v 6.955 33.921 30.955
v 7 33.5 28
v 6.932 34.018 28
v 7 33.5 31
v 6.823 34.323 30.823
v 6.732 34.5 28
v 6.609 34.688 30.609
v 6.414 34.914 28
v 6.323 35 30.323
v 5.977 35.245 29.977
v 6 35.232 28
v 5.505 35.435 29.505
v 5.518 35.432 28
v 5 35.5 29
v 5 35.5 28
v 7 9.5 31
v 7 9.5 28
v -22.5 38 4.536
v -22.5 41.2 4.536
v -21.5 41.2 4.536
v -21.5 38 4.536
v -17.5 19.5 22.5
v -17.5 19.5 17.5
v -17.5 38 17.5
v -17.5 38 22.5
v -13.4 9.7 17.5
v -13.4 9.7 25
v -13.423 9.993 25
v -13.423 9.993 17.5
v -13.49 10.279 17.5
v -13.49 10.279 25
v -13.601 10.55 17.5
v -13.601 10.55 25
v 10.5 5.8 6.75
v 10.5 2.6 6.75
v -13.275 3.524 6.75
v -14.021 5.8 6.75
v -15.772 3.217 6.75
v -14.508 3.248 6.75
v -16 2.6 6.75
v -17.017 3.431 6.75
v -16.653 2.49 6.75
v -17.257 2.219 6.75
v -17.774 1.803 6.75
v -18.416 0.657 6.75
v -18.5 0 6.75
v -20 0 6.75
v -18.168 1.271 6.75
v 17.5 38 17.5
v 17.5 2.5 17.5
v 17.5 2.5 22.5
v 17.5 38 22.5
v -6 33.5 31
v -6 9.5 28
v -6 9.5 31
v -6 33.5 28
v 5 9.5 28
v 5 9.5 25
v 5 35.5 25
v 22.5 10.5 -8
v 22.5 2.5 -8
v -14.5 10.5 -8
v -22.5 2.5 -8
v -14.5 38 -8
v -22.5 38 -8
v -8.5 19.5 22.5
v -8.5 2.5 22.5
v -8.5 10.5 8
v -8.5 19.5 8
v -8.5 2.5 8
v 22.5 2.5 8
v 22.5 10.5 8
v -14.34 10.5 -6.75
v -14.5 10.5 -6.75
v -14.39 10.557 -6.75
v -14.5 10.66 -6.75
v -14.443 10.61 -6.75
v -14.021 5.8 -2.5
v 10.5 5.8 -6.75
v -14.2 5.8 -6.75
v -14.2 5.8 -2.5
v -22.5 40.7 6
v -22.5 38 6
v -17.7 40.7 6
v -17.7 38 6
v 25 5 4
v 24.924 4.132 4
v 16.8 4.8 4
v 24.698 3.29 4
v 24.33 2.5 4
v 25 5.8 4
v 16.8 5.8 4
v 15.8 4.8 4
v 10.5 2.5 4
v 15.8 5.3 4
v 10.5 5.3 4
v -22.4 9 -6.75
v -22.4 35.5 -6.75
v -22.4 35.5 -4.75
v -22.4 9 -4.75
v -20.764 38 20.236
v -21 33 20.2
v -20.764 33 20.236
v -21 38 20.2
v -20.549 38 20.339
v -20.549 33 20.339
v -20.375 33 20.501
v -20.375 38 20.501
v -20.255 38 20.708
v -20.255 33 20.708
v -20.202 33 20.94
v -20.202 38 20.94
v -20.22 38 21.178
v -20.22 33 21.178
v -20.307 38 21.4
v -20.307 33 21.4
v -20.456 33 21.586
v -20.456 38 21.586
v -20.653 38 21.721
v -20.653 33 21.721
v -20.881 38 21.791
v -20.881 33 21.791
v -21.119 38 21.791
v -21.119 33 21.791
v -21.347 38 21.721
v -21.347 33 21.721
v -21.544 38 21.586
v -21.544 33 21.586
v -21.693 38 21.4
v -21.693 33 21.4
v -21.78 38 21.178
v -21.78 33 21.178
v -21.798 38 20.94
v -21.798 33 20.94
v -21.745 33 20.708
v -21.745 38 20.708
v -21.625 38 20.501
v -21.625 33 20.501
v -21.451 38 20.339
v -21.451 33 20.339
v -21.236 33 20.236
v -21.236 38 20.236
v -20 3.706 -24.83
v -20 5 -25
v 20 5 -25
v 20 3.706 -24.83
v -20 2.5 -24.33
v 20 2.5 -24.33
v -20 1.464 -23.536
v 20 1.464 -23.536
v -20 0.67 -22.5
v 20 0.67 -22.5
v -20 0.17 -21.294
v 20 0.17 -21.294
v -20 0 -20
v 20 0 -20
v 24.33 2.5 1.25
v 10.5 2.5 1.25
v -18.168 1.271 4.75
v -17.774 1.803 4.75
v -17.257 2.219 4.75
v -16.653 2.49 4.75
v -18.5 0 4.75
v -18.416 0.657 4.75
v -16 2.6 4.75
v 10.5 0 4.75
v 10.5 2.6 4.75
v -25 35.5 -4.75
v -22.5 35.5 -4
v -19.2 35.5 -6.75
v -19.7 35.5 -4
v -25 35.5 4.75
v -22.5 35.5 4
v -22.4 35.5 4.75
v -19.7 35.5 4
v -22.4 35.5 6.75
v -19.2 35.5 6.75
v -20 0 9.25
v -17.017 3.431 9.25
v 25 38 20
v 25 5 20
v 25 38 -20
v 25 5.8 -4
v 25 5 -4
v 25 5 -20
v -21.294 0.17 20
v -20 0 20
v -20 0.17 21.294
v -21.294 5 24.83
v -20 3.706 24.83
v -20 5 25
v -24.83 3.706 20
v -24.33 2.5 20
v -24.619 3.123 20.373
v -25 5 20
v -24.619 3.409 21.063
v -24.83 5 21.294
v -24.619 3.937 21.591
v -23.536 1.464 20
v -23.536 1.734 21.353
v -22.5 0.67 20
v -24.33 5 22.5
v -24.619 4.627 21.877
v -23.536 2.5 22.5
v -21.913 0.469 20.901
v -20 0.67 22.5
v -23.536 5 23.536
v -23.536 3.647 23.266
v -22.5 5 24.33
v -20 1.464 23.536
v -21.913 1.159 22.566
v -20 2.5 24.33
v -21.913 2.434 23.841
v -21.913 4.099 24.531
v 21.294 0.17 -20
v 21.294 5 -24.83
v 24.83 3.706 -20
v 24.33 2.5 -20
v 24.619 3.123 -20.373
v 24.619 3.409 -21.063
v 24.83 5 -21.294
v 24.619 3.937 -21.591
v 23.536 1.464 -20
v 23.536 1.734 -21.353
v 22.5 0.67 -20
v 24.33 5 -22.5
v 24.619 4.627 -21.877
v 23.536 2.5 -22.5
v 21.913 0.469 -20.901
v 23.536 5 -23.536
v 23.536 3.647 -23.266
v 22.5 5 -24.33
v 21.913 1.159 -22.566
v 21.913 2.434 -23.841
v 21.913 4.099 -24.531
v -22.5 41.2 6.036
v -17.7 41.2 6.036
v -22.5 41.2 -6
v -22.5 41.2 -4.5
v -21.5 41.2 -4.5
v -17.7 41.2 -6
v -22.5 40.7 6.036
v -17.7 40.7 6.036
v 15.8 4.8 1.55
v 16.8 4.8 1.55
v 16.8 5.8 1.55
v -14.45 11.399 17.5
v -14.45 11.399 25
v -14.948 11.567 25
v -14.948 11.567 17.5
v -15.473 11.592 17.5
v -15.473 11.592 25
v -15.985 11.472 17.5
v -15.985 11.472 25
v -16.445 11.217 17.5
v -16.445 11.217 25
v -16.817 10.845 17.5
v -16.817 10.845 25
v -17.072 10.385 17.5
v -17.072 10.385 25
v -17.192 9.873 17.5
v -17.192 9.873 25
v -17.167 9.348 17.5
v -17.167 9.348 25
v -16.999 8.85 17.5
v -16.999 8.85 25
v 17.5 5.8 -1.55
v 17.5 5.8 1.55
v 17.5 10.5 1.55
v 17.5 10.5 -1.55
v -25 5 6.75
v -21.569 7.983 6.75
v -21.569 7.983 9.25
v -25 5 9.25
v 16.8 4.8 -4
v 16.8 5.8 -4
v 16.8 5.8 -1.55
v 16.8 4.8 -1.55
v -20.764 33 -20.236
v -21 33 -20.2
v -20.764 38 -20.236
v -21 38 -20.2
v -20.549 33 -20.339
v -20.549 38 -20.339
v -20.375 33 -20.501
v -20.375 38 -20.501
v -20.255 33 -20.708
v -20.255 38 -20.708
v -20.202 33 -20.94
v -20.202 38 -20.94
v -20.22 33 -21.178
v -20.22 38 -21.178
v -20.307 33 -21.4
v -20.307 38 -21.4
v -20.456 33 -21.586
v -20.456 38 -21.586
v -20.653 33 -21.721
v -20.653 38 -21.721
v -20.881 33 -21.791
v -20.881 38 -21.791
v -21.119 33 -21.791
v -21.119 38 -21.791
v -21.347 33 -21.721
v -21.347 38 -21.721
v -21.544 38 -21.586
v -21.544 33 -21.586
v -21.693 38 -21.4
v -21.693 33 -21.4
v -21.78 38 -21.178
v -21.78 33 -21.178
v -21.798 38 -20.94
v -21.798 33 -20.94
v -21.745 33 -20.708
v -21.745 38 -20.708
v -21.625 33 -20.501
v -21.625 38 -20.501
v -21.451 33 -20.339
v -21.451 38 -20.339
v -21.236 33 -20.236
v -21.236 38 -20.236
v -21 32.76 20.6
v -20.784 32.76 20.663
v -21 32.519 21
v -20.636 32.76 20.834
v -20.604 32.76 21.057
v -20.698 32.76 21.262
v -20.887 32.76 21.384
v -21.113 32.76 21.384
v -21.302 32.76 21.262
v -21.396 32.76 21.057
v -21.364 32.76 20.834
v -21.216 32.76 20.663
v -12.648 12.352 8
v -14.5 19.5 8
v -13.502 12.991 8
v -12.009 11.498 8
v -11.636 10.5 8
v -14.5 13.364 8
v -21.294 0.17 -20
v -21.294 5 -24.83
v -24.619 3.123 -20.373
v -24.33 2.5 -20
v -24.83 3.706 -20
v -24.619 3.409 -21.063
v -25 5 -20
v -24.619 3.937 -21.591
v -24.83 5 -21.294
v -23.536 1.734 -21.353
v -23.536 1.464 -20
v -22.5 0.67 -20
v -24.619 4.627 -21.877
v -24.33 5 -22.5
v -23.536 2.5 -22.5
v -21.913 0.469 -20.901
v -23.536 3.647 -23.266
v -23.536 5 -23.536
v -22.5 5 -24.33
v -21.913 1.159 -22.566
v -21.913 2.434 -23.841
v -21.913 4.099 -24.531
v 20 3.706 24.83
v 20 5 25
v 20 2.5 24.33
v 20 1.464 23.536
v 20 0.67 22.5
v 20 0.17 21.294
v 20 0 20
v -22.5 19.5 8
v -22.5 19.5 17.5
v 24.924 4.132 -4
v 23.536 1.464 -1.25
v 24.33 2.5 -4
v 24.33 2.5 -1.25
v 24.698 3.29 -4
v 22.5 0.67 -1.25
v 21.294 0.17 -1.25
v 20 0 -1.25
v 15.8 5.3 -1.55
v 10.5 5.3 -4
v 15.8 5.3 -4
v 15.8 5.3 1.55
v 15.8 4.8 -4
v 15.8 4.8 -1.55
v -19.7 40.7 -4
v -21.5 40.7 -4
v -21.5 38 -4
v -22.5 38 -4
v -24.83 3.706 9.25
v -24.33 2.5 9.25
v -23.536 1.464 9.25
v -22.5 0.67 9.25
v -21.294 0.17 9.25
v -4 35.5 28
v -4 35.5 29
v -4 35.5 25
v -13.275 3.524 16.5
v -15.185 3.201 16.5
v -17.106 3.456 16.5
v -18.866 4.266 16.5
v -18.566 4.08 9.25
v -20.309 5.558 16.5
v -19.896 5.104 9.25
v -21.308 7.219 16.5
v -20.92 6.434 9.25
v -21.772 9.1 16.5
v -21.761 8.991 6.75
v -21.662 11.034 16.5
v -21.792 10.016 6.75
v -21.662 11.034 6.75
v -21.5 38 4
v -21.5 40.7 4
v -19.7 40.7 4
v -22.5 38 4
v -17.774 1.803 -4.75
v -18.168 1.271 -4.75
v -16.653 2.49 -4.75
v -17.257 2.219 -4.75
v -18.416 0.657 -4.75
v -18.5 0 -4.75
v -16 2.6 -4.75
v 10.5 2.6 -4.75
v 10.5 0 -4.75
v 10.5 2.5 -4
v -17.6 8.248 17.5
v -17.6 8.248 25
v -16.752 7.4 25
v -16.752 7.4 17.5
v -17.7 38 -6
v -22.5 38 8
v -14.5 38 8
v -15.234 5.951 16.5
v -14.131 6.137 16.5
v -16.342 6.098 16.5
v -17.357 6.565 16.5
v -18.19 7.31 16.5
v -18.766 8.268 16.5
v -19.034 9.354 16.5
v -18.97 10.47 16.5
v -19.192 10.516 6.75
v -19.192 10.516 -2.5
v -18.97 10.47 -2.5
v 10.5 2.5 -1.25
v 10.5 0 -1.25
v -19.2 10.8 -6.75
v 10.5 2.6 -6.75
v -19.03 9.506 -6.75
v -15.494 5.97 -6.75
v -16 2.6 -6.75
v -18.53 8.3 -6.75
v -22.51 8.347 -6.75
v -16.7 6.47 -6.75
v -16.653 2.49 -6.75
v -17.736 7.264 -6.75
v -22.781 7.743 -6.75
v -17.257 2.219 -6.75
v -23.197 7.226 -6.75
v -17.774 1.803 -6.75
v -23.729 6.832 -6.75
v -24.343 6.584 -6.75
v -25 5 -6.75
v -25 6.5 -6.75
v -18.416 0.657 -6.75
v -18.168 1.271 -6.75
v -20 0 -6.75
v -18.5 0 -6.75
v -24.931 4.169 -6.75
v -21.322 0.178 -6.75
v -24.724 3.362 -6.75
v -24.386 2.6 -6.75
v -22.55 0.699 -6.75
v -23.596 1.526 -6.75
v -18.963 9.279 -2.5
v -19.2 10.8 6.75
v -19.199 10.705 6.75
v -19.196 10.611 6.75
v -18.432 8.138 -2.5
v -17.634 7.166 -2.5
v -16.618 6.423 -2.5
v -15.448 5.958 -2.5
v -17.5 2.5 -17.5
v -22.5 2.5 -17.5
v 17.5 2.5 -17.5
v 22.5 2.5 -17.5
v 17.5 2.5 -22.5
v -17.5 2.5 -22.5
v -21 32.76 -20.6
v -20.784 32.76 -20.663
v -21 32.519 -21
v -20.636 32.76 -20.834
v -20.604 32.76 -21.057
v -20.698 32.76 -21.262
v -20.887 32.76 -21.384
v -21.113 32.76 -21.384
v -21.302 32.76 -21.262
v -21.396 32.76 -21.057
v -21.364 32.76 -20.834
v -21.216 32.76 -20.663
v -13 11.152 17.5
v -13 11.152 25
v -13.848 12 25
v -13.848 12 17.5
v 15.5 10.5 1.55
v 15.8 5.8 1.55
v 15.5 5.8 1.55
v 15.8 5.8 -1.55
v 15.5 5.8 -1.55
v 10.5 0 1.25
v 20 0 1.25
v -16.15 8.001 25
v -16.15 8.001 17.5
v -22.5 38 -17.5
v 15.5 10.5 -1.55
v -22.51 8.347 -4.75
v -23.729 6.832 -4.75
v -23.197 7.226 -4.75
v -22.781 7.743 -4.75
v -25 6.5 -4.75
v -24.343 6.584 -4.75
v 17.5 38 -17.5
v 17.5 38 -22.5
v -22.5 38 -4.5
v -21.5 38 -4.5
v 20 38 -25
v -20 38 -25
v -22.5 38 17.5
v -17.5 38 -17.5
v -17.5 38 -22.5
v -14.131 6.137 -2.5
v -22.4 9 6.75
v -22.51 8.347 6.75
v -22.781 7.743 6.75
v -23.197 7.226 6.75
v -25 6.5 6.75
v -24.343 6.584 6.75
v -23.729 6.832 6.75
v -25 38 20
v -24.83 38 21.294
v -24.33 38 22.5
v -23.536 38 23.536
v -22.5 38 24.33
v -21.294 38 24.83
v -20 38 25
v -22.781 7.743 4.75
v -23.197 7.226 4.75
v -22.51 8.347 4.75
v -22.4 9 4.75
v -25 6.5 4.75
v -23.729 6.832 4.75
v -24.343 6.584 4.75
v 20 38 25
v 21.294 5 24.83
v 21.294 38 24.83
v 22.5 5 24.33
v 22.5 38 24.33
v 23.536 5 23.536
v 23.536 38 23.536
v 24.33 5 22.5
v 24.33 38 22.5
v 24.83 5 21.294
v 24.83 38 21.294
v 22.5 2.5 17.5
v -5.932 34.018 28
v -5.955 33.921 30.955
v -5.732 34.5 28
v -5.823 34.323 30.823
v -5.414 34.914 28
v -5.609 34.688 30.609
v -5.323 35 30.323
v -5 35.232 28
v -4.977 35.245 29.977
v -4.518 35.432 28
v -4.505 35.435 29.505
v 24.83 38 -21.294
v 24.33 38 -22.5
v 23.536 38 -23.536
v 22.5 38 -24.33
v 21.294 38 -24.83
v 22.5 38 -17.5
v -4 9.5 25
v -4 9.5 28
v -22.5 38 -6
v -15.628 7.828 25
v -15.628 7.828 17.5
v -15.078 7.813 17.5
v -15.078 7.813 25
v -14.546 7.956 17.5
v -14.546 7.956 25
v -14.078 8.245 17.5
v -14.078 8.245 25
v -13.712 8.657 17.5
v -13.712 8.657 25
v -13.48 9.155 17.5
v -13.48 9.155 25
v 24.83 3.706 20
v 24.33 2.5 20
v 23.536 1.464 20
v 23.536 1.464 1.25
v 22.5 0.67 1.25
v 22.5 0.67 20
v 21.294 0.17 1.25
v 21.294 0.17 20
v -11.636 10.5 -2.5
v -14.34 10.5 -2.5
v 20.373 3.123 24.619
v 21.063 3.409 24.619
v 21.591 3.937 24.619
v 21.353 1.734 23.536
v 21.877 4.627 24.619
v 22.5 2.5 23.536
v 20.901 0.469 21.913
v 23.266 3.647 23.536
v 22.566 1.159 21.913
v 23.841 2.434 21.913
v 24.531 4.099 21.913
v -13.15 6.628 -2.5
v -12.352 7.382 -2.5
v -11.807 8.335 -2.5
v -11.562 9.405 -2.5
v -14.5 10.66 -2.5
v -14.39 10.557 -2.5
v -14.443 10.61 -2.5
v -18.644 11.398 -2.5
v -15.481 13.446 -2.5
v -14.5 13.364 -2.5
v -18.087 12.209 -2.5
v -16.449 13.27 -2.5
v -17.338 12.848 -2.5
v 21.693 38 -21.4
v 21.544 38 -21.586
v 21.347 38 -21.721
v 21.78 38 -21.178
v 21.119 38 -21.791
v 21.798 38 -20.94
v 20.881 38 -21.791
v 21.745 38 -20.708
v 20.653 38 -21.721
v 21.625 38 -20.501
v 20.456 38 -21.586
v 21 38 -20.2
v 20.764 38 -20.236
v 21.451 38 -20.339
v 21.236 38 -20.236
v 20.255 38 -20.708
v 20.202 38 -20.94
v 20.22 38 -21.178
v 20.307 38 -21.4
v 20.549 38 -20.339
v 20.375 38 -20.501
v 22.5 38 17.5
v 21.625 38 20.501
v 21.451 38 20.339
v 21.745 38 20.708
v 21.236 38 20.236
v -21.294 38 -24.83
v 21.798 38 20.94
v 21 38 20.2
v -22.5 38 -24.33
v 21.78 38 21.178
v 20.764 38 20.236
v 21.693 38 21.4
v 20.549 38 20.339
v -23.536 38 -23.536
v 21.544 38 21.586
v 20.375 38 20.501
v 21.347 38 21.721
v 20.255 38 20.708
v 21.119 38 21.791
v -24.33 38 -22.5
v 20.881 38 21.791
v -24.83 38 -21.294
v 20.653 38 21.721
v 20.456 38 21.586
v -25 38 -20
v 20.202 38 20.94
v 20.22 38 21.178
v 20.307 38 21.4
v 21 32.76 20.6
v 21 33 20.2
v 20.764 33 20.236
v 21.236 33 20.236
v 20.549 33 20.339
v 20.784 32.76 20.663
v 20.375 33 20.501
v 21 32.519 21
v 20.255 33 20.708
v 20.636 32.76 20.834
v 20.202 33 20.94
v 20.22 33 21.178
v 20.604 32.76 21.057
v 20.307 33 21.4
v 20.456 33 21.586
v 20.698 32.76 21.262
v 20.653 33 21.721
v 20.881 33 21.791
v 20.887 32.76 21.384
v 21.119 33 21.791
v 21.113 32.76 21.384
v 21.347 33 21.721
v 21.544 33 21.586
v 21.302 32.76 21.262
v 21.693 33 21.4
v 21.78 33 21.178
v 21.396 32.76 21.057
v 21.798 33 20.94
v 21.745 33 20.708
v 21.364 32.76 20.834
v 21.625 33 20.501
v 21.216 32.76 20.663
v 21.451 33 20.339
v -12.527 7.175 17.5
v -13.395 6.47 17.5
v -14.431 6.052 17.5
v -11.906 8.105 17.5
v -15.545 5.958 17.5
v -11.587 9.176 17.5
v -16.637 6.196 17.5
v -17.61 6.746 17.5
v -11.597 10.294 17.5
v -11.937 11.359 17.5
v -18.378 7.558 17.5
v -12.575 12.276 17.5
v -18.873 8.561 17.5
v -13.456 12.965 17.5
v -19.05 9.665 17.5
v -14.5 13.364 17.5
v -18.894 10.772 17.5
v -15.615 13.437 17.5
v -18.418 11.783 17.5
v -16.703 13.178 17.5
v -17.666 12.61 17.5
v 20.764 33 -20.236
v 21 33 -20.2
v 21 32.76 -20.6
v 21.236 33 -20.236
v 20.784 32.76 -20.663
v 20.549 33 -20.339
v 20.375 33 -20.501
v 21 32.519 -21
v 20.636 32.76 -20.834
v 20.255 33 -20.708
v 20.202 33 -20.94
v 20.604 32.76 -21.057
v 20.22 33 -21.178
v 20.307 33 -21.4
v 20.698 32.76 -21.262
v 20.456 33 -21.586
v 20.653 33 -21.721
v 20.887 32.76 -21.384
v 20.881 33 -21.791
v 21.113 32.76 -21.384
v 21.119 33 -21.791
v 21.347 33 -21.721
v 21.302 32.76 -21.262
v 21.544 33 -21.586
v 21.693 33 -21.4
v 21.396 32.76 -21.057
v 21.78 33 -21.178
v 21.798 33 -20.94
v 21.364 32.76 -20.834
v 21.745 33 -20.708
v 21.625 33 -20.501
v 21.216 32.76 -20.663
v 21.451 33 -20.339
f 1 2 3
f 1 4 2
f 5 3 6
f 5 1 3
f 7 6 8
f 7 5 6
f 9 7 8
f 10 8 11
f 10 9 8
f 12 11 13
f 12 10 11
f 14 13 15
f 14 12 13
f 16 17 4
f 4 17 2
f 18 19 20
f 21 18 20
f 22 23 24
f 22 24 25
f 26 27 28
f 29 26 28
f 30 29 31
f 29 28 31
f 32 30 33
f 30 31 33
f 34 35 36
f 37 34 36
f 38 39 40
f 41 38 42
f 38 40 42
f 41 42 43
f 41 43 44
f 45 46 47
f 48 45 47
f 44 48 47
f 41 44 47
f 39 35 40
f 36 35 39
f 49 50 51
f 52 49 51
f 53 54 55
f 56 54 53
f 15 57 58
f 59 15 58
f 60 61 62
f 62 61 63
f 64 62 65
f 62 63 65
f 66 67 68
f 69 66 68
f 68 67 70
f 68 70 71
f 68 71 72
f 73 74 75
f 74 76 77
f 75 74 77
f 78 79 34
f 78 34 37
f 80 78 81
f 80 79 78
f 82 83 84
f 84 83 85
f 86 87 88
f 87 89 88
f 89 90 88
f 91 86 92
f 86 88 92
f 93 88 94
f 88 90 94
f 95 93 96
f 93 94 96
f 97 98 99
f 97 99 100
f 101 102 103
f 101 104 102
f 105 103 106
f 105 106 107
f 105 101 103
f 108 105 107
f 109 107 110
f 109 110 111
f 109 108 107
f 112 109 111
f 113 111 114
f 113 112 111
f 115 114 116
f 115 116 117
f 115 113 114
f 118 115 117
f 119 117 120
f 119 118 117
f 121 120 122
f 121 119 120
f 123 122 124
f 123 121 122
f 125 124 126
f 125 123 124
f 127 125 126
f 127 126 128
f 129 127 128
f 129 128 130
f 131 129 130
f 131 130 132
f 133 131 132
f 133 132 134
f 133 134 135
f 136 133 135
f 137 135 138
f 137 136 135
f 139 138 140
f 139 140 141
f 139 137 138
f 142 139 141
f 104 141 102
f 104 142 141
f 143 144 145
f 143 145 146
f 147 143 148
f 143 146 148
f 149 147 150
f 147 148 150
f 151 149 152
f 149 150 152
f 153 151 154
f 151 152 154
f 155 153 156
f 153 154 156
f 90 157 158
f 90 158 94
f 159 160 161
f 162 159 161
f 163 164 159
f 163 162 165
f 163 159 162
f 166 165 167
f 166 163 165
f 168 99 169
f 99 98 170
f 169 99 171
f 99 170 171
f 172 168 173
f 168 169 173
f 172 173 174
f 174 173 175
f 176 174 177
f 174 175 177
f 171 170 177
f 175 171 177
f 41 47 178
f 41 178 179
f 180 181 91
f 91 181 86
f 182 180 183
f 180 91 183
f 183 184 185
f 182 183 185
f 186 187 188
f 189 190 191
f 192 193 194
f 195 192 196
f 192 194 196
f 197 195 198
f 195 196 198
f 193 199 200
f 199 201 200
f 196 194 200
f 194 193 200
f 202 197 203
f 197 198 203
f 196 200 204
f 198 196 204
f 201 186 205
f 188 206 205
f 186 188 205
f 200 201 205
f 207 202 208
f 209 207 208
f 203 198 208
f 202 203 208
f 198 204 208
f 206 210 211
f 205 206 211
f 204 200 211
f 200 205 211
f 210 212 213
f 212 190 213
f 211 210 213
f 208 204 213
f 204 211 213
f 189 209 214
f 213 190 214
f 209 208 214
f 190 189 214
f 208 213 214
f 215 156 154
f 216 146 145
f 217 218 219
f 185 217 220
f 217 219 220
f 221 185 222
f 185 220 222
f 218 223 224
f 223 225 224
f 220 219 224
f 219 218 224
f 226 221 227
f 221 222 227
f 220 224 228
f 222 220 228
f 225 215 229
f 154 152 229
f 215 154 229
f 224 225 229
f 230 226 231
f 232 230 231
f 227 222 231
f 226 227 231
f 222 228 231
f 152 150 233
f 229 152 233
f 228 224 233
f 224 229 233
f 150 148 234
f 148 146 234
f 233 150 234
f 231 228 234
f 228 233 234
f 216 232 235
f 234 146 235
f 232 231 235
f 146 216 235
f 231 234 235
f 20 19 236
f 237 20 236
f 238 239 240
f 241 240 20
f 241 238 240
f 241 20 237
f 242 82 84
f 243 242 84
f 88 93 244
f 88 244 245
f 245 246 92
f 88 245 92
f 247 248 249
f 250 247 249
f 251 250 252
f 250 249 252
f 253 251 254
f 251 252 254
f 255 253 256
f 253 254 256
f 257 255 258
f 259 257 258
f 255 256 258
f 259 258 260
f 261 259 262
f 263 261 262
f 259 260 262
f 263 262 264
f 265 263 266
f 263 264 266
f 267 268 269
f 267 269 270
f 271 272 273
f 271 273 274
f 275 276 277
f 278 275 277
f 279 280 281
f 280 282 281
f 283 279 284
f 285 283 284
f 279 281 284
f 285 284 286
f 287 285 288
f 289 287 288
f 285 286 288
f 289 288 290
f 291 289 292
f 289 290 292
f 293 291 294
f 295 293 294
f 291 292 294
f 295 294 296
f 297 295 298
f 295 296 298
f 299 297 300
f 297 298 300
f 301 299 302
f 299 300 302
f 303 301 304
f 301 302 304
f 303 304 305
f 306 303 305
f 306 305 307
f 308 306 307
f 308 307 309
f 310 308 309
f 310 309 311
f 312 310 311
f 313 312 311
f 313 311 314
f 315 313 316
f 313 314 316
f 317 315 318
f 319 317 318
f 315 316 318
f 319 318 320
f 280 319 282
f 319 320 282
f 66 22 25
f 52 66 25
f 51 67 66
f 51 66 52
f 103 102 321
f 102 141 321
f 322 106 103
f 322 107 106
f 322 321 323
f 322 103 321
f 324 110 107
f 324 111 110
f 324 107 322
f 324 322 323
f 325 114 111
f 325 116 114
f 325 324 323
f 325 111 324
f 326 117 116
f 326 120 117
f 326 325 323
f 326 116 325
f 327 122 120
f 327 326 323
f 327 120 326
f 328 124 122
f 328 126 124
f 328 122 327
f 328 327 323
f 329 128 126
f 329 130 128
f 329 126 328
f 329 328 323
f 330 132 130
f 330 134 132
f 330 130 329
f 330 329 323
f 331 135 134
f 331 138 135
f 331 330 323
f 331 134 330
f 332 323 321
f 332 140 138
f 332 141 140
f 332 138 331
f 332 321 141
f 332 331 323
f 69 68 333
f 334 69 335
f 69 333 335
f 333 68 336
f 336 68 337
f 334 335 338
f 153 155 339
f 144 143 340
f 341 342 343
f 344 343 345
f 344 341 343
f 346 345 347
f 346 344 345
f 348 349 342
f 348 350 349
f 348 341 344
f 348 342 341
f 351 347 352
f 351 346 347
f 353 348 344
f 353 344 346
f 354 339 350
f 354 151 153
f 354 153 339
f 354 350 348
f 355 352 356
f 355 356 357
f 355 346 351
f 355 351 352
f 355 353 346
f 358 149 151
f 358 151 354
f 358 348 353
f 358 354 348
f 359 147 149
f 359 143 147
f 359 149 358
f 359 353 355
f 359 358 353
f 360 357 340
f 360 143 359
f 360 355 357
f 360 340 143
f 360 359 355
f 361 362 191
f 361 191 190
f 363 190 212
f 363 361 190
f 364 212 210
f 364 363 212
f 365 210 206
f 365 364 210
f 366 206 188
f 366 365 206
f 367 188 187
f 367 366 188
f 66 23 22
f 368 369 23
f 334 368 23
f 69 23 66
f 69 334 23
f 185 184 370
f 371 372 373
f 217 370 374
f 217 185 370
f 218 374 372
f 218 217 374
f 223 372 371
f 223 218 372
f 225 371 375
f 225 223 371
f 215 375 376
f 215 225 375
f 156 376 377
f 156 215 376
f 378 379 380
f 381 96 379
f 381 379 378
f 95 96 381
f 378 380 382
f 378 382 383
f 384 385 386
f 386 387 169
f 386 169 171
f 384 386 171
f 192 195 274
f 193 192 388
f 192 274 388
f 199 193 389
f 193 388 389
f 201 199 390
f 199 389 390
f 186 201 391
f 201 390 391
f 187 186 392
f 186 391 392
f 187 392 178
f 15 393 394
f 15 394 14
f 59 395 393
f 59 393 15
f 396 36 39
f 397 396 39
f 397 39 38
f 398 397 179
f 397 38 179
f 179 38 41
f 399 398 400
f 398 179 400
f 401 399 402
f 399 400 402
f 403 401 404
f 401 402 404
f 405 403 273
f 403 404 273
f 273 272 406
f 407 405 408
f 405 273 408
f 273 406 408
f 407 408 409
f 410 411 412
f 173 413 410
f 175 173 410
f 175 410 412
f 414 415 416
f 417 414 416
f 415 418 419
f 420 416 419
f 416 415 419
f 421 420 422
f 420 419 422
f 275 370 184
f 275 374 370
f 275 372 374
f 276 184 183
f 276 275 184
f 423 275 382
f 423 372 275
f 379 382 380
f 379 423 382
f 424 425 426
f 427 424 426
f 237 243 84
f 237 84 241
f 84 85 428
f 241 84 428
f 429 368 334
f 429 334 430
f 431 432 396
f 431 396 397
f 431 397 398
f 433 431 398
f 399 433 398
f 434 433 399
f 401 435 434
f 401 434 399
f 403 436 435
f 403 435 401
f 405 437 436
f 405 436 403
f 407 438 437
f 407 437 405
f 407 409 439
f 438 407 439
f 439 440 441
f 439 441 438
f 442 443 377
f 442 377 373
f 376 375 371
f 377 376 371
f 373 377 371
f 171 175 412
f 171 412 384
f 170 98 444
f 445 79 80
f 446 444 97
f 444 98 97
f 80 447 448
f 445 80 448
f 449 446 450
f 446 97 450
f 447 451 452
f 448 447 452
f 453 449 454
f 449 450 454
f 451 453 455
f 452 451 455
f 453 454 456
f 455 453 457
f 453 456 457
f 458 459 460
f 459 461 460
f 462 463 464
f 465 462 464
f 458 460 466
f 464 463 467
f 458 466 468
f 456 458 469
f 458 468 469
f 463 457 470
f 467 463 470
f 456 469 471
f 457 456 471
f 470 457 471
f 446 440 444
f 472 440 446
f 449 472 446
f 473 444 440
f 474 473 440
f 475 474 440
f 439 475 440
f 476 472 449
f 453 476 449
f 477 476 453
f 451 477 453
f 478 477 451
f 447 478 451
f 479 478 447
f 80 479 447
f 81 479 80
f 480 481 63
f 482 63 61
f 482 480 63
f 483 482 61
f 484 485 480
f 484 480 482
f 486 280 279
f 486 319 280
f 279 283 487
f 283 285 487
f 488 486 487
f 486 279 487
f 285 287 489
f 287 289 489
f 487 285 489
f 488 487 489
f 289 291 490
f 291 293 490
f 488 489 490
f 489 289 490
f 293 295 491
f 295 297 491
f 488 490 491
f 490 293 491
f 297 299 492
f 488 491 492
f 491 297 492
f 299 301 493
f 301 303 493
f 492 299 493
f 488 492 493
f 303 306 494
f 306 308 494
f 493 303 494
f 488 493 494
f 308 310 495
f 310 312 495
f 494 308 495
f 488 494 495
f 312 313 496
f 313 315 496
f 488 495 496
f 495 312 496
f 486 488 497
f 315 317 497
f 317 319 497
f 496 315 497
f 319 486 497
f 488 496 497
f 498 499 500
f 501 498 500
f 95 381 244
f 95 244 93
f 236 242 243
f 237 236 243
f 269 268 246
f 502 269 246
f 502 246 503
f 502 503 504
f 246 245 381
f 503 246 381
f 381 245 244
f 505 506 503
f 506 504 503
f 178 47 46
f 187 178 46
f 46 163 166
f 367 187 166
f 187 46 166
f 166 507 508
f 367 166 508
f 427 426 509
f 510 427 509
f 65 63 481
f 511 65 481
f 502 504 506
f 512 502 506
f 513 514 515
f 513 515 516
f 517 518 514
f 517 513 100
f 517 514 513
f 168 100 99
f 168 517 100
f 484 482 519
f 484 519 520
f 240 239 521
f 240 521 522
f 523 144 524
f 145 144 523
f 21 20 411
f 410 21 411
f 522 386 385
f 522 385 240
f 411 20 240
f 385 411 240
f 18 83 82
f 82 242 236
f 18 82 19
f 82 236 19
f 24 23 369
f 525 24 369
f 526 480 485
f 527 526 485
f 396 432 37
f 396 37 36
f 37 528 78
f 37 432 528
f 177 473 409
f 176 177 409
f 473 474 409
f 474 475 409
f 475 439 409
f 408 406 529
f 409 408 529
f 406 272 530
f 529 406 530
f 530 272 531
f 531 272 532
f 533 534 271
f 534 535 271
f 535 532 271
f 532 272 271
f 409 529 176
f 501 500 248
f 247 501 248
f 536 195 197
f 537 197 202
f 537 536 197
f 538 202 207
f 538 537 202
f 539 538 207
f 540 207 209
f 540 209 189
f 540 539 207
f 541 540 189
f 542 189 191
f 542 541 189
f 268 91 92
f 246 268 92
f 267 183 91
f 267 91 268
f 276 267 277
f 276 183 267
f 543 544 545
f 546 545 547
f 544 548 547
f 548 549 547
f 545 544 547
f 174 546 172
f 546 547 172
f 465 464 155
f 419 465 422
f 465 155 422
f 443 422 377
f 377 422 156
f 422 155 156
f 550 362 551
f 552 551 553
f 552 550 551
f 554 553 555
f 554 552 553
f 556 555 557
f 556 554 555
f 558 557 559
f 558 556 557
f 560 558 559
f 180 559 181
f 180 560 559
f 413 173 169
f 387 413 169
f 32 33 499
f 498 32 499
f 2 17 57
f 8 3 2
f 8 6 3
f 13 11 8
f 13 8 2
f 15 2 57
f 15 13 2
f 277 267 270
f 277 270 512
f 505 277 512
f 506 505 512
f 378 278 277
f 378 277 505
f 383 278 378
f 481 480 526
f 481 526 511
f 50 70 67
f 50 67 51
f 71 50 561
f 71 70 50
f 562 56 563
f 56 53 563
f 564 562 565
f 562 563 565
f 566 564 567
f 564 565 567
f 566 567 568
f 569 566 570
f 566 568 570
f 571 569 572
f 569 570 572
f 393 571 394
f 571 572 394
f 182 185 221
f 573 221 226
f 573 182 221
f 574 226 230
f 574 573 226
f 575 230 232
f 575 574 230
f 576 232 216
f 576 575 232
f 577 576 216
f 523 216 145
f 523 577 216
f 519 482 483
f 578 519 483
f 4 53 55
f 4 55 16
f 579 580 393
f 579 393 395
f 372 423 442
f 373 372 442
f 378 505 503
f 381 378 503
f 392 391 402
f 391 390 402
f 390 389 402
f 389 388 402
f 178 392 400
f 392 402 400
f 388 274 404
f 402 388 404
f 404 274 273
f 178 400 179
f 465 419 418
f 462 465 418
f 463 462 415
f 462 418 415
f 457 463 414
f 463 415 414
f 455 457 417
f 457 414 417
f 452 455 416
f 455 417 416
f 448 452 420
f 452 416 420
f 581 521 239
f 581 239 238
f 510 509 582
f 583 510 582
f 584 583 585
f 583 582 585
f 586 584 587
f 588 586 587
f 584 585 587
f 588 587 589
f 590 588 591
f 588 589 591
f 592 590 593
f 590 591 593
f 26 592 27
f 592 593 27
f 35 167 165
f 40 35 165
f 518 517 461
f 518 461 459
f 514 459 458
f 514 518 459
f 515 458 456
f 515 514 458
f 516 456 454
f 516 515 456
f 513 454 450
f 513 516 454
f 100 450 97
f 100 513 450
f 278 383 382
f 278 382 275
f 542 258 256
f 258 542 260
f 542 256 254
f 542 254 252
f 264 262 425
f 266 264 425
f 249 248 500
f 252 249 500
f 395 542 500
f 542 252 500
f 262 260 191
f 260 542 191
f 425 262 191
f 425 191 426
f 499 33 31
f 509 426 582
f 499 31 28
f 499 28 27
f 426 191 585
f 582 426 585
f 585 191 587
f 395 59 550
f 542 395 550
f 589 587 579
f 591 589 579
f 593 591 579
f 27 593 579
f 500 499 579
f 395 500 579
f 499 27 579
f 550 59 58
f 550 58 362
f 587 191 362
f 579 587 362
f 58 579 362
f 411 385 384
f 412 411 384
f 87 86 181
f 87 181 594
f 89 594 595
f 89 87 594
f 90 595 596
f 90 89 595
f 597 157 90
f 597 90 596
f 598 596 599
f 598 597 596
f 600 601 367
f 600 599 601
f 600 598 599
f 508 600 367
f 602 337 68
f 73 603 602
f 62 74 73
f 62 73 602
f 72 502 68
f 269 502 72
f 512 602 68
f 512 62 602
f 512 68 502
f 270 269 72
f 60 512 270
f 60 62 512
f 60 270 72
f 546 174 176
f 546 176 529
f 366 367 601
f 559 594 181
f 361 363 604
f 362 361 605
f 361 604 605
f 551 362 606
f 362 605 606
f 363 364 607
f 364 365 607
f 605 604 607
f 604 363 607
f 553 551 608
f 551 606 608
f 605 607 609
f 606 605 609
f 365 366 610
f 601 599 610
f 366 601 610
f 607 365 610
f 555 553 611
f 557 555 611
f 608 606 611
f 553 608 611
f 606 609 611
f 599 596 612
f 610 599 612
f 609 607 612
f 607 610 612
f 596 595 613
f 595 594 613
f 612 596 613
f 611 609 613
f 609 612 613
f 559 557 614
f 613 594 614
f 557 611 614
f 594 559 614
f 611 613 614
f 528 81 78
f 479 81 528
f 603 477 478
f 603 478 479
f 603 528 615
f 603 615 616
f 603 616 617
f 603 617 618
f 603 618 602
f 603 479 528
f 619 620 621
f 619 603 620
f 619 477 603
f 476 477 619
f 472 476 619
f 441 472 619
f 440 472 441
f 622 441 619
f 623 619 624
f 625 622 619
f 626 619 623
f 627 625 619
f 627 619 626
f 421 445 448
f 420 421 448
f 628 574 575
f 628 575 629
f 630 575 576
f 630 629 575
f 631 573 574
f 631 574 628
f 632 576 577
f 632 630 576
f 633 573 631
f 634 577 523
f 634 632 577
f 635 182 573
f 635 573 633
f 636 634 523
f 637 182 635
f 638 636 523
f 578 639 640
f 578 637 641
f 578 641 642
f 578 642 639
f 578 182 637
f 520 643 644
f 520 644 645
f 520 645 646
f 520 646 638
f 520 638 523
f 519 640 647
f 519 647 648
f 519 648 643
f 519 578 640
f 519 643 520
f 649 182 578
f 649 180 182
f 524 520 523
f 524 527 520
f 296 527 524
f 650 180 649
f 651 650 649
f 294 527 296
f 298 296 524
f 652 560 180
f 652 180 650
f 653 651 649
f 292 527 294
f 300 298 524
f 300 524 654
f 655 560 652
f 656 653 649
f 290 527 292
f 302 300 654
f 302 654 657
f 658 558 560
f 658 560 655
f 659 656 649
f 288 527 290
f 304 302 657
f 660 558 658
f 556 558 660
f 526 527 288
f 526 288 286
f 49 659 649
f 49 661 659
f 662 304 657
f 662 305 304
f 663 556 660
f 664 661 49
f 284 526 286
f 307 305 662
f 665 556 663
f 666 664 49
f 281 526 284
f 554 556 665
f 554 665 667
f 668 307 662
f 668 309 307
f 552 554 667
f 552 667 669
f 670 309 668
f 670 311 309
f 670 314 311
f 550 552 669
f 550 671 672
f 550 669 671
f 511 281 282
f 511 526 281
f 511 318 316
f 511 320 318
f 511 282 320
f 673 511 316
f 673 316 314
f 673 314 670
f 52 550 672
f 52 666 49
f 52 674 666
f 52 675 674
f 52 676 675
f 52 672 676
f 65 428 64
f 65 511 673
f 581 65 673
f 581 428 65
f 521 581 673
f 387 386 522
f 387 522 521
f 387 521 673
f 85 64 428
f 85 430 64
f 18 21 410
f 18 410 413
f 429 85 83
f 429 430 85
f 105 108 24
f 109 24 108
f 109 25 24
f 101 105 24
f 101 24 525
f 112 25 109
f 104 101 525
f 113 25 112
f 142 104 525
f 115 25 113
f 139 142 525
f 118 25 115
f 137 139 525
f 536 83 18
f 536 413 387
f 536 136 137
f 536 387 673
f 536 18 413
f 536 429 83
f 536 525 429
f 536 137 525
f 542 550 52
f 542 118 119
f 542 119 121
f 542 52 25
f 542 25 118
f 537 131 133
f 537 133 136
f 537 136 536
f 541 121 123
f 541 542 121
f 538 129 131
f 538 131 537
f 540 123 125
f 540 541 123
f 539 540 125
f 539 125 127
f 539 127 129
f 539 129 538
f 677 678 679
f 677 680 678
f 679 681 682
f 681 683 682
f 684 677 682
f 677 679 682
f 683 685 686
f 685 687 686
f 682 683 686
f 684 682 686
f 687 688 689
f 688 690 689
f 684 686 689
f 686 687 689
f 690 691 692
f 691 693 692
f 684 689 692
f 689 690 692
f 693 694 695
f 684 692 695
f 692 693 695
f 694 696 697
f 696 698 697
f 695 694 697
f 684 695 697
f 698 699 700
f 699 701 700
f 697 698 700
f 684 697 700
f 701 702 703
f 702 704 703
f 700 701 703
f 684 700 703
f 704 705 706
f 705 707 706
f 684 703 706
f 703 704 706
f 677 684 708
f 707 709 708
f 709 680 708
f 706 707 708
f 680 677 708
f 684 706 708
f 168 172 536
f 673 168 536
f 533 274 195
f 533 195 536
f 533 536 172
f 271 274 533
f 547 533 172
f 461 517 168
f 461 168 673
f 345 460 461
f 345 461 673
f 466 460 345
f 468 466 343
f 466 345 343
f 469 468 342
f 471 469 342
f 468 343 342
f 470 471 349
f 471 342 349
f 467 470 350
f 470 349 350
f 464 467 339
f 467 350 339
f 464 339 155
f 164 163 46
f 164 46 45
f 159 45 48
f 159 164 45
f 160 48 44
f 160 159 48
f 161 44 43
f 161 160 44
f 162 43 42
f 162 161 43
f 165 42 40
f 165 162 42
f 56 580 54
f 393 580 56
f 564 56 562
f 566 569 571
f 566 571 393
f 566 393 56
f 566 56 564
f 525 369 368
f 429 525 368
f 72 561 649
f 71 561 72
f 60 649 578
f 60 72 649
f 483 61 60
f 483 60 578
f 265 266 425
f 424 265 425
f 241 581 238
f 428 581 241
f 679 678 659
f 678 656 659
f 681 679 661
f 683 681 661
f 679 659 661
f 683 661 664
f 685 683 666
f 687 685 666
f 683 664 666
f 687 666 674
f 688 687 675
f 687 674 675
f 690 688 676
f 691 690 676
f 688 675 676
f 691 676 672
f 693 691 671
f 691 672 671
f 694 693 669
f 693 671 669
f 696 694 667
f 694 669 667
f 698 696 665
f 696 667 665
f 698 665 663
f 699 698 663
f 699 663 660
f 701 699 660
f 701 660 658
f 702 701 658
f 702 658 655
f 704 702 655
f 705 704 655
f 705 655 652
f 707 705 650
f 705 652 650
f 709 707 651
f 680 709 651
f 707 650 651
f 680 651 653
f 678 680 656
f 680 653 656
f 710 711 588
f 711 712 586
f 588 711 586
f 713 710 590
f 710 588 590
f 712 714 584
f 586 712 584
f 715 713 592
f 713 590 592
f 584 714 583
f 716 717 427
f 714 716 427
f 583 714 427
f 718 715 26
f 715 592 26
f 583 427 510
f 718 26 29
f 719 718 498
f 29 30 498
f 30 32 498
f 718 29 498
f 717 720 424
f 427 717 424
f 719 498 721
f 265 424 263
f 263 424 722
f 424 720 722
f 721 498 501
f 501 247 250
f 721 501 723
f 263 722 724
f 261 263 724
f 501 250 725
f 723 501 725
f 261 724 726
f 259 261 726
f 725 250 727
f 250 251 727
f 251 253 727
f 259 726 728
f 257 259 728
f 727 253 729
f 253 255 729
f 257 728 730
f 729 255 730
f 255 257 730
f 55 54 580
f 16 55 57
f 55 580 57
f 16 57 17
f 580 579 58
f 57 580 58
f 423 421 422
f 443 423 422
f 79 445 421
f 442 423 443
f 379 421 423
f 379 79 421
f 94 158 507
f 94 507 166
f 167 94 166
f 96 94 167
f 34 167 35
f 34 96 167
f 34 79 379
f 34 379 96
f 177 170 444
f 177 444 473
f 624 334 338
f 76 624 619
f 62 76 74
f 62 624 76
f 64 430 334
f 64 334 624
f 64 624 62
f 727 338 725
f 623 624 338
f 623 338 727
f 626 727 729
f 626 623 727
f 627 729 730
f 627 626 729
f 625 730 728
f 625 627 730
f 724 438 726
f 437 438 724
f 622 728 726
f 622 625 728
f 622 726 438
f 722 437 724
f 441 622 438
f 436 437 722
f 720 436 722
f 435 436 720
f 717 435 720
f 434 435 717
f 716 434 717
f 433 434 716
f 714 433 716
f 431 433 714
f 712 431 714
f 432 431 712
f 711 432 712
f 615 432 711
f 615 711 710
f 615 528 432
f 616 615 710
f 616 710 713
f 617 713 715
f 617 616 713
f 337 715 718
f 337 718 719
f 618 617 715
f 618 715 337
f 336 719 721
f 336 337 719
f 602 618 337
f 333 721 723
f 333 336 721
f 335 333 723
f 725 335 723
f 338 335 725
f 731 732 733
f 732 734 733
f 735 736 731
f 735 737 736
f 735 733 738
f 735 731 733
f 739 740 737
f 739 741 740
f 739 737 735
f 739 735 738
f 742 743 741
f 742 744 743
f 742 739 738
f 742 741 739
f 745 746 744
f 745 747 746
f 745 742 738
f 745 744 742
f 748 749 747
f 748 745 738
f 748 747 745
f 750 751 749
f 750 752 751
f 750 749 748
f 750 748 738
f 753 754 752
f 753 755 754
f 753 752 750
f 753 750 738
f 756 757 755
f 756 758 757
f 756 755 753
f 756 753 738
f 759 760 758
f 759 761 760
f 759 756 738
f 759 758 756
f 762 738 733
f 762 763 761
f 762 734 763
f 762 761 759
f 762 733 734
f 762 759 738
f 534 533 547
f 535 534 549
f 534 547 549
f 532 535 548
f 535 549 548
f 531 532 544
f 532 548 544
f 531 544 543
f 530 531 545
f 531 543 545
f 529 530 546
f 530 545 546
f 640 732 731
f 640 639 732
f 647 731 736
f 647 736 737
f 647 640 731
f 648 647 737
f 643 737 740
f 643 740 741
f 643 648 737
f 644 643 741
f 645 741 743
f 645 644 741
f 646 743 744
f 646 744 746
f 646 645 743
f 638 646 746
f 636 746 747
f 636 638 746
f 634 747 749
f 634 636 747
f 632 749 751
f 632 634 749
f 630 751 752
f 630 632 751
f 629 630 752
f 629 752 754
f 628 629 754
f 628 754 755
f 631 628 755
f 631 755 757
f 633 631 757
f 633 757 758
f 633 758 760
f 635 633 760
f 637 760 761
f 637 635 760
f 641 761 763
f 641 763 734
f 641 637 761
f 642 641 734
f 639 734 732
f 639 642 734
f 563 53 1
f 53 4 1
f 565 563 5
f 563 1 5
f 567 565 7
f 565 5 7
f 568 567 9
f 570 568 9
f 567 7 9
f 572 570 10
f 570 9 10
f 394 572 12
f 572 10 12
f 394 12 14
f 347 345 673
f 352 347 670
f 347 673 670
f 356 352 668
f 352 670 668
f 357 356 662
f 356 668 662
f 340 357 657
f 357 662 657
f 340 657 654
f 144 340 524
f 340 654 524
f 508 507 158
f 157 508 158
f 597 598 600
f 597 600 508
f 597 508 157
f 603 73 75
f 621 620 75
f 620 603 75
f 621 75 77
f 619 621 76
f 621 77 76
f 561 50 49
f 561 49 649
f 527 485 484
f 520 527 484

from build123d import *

# Parameters (mm, degrees)
SKETCH1_W                          = 50
SKETCH1_H                          = 50
BASE_SHELL_DEPTH                   = 38
SHELL1_T                           = -2.5
FILLET1_R                          = 5
SKETCH2_W                          = 13
SKETCH2_H                          = 26
LOCK_CONNECTOR_EXTRUDE_DEPTH       = 6
SKETCH3_W                          = 3
SKETCH3_H                          = 2
LOCK_CONNECTOR_CUT_DEPTH           = 54.350257731
LOCK_CONNECTOR_FILLET_R            = 2
SKETCH8_W                          = 45
SKETCH8_H                          = 16
BOTTOM_CONNECTOR_INSIDE_DEPTH      = 8
SKETCH10_W                         = 35.5
SKETCH10_H                         = 9.5
BOTTOM_FEMALE_BOTTOM_CUT_DEPTH     = 2.6
SKETCH7_W                          = 35.5
SKETCH7_H                          = 13.5
BOTTOM_FEMALE_TOP_CUT_DEPTH        = 3.2
ROUNDED_ENTRANCE_REACH             = 59.854
ROUNDED_ENTRANCE_DIRECTION_2_REACH = 59.854
SKETCH22_W                         = 8
SKETCH22_H                         = 3.3
HEADER_PIN_CUT_DEPTH               = 61.541308212
HEADER_PIN_HOLDER_REACH            = 57.045
SKETCH23_W                         = 14.435585072
SKETCH23_H                         = 2.5
SKETCH25_W                         = 2
SKETCH25_H                         = 3.1
WIRE_CUT_DEPTH                     = 52.21367005
SKETCH57_W                         = 1
SKETCH57_H                         = 2.45
PIN_STOPPER_DEPTH                  = 1
SKETCH15_W                         = 16
SKETCH15_H                         = 27.5
SIDE_CONNECTOR_INSIDE_DEPTH        = 8
SKETCH58_W                         = 3.3
SKETCH58_H                         = 8
SIDE_POGO_GAP_DEPTH                = 54.350257731
SKETCH60_W                         = 8
SKETCH60_H                         = 2.5
SIDE_POGO_SUPPORT_DEPTH            = 0.5
SKETCH14_R                         = 1.25
LOCK_BOTTOM_SUPPORT_DEPTH          = 4.5
SKETCH27_W                         = 5
SKETCH27_H                         = 5
SCREW_PILLAR_DEPTH                 = 35.5
MIRROR2_COPY_1_SKETCH_W            = 5
MIRROR2_COPY_1_SKETCH_H            = 5
MIRROR2_COPY_1_DEPTH               = 35.5
LOCK_SUPPORT_DEPTH                 = 17
LOCK_CUT_DEPTH                     = 19.5
SKETCH11_R                         = 3.75
SPRING_GAP_DEPTH                   = 20
FLANG_GAP_DEPTH                    = 19
FLANG_SCREW_CUT_DEPTH              = 2.5
FILLET2_R                          = 5
SKETCH59_W                         = 5.3
SKETCH59_H                         = 8
BOTTOM_POGO_SUPPORT_DEPTH          = 0.5
SKETCH62_W                         = 6.8
SKETCH62_H                         = 12
SKETCH62_W_2                       = 2.8
SKETCH62_H_2                       = 8
SIDE_POGO_HOLDER_DEPTH             = 2.7
SKETCH63_W                         = 6.8
SKETCH63_H                         = 12.036243668
SIDE_POGO_TOP_DEPTH                = 0.5
SIDE_POGO_HOLE_REACH               = 59.301
SKETCH64_W                         = 3
SKETCH64_H                         = 9.036243668
SKETCH65_W                         = 2
SKETCH65_H                         = 1.5
CUT_EXTRUDE8_DEPTH                 = 3.2


with BuildPart() as part:
    # Sketch1 → base shell (new body)
    with BuildSketch(Plane(origin=(0, 0, 0), x_dir=(1, 0, 0), z_dir=(0, 1, 0))):
        Rectangle(SKETCH1_W, SKETCH1_H)
    extrude(amount=BASE_SHELL_DEPTH)

    # Shell1
    shell1_openings = [part.faces().sort_by_distance(p)[0] for p in [
        (0, 38, 0),
    ]]
    offset(amount=SHELL1_T, openings=shell1_openings, kind=Kind.INTERSECTION)

    # Fillet1
    fillet1_edges = [part.edges().sort_by_distance(p)[0] for p in [
        (0, 0, -25),
        (25, 0, 0),
        (0, 0, 25),
        (-25, 0, 0),
        (-25, 19, -25),
        (25, 19, -25),
        (25, 19, 25),
        (-25, 19, 25),
    ]]
    fillet(fillet1_edges, radius=FILLET1_R)

    # Sketch2 → lock connector extrude (add)
    with BuildSketch(Plane.XY.offset(25)):
        with Locations((0.5, 22.5)):
            Rectangle(SKETCH2_W, SKETCH2_H)
    extrude(amount=LOCK_CONNECTOR_EXTRUDE_DEPTH)

    # Sketch3 → lock connector cut (cut, through all)
    with BuildSketch(Plane(origin=(0, 35.5, 0), x_dir=(0, 0, -1), z_dir=(0, 1, 0))):
        with Locations((-26.5, -6)):
            Rectangle(SKETCH3_W, SKETCH3_H)
        with Locations((-26.5, 5)):
            Rectangle(SKETCH3_W, SKETCH3_H)
    extrude(amount=-LOCK_CONNECTOR_CUT_DEPTH, mode=Mode.SUBTRACT)

    # lock connector fillet
    lock_connector_fillet_edges = [part.edges().sort_by_distance(p)[0] for p in [
        (7, 35.5, 29.5),
        (-6, 35.5, 29.5),
        (0.5, 35.5, 31),
    ]]
    fillet(lock_connector_fillet_edges, radius=LOCK_CONNECTOR_FILLET_R)

    # Sketch8 → bottom connector inside (add)
    with BuildSketch(Plane(origin=(0, 2.5, 0), x_dir=(1, 0, 0), z_dir=(0, 1, 0))):
        Rectangle(SKETCH8_W, SKETCH8_H)
    extrude(amount=BOTTOM_CONNECTOR_INSIDE_DEPTH)

    # Sketch10 → bottom female bottom cut (cut)
    with BuildSketch(Plane.XZ):
        with Locations((-7.25, 0)):
            Rectangle(SKETCH10_W, SKETCH10_H)
    bottom_female_bottom_cut = extrude(amount=-BOTTOM_FEMALE_BOTTOM_CUT_DEPTH, mode=Mode.SUBTRACT)

    # Sketch7 → bottom female top cut (cut)
    with BuildSketch(Plane(origin=(0, 2.6, 0), x_dir=(-1, 0, 0), z_dir=(0, -1, 0))):
        with Locations((7.25, 0)):
            Rectangle(SKETCH7_W, SKETCH7_H)
    bottom_female_top_cut = extrude(amount=-BOTTOM_FEMALE_TOP_CUT_DEPTH, mode=Mode.SUBTRACT)

    # rounded entrance: up to this face of the body (flat: up to its plane)
    rounded_entrance_end = Plane(part.part.faces().sort_by_distance((-7.175733888, 4.204259527, -6.75))[0])
    # Sketch26 → rounded entrance (cut, up to the picked face)
    with BuildSketch(Plane.XY.offset(-4.75), mode=Mode.PRIVATE) as rounded_entrance_sk1:
        with BuildLine():
            Line((-16, 2.6), (-24.38634244, 2.6))
            ThreePointArc((-24.38634244, 2.6), (-22.549509757, 0.698837366), (-20, 0))
            Line((-20, 0), (-18.5, 0))
            ThreePointArc((-18.5, 0), (-17.773607635, 1.80346888), (-16, 2.6))
        make_face()
    rounded_entrance_tool1 = split(extrude(rounded_entrance_sk1.sketch, amount=-ROUNDED_ENTRANCE_REACH, mode=Mode.PRIVATE), bisect_by=rounded_entrance_end, keep=Keep.BOTH, mode=Mode.PRIVATE)
    rounded_entrance = rounded_entrance_tool1.solids().sort_by(Axis((-20.596969, 1.517539, -4.75), (0, 0, -1)))[0]
    add(rounded_entrance, mode=Mode.SUBTRACT)

    # rounded entrance direction 2: up to this face of the body (flat: up to its plane)
    rounded_entrance_direction_2_end = Plane(part.part.faces().sort_by_distance((-7.175733888, 4.204259527, 6.75))[0])
    # Sketch26 → rounded entrance direction 2 (cut, up to the picked face)
    with BuildSketch(Plane.XY.offset(-4.75), mode=Mode.PRIVATE) as rounded_entrance_direction_2_sk1:
        with BuildLine():
            Line((-16, 2.6), (-24.38634244, 2.6))
            ThreePointArc((-24.38634244, 2.6), (-22.549509757, 0.698837366), (-20, 0))
            Line((-20, 0), (-18.5, 0))
            ThreePointArc((-18.5, 0), (-17.773607635, 1.80346888), (-16, 2.6))
        make_face()
    rounded_entrance_direction_2_tool1 = split(extrude(rounded_entrance_direction_2_sk1.sketch, amount=ROUNDED_ENTRANCE_DIRECTION_2_REACH, mode=Mode.PRIVATE), bisect_by=rounded_entrance_direction_2_end, keep=Keep.BOTH, mode=Mode.PRIVATE)
    rounded_entrance_direction_2 = rounded_entrance_direction_2_tool1.solids().sort_by(Axis((-20.596969, 1.517539, -4.75), (0, 0, 1)))[0]
    add(rounded_entrance_direction_2, mode=Mode.SUBTRACT)

    # Sketch22 → header pin cut (cut, through all)
    with BuildSketch(Plane.ZY.offset(-10.5)):
        with Locations((0, 4.15)):
            Rectangle(SKETCH22_W, SKETCH22_H)
    extrude(amount=-HEADER_PIN_CUT_DEPTH, mode=Mode.SUBTRACT)

    # Sketch23 → header pin holder (cut, up to next)
    with BuildSketch(Plane.XZ, mode=Mode.PRIVATE) as header_pin_holder_sk1:
        with Locations((17.717792536, 0)):
            Rectangle(SKETCH23_W, SKETCH23_H)
    header_pin_holder_tool1 = extrude(header_pin_holder_sk1.sketch, amount=-HEADER_PIN_HOLDER_REACH, mode=Mode.PRIVATE) & part.part
    add(header_pin_holder_tool1.solids().sort_by_distance((17.717793, 0, 0))[0], mode=Mode.SUBTRACT)

    # Sketch25 → wire cut (cut, through all)
    with BuildSketch(Plane(origin=(0, 5.8, 0), x_dir=(-1, 0, 0), z_dir=(0, -1, 0))):
        with Locations((-16.5, 0)):
            Rectangle(SKETCH25_W, SKETCH25_H)
    extrude(amount=-WIRE_CUT_DEPTH, mode=Mode.SUBTRACT)

    # Sketch57 → pin stopper (add)
    with BuildSketch(Plane.XZ.offset(-5.8)):
        with Locations((16.3, 2.775)):
            Rectangle(SKETCH57_W, SKETCH57_H)
        with Locations((16.3, -2.775)):
            Rectangle(SKETCH57_W, SKETCH57_H)
    extrude(amount=PIN_STOPPER_DEPTH)

    # Sketch15 → side connector inside (add)
    with BuildSketch(Plane(origin=(-22.5, 0, 0), x_dir=(0, 0, -1), z_dir=(1, 0, 0))):
        with Locations((0, 24.25)):
            Rectangle(SKETCH15_W, SKETCH15_H)
    extrude(amount=SIDE_CONNECTOR_INSIDE_DEPTH)

    # side connector mirror: bottom female bottom cut, bottom female top cut, rounded entrance, rounded entrance direction 2 across plane
    add(bottom_female_bottom_cut.mirror(Plane(origin=(-12.5, 12.5, 0), x_dir=(0, 0, 1), z_dir=(0.7071067811865488, -0.7071067811865464, 0))), mode=Mode.SUBTRACT)
    add(bottom_female_top_cut.mirror(Plane(origin=(-12.5, 12.5, 0), x_dir=(0, 0, 1), z_dir=(0.7071067811865488, -0.7071067811865464, 0))), mode=Mode.SUBTRACT)
    add(rounded_entrance.mirror(Plane(origin=(-12.5, 12.5, 0), x_dir=(0, 0, 1), z_dir=(0.7071067811865488, -0.7071067811865464, 0))), mode=Mode.SUBTRACT)
    add(rounded_entrance_direction_2.mirror(Plane(origin=(-12.5, 12.5, 0), x_dir=(0, 0, 1), z_dir=(0.7071067811865488, -0.7071067811865464, 0))), mode=Mode.SUBTRACT)

    # Sketch58 → side pogo gap (cut, through all)
    with BuildSketch(Plane.XZ.offset(-35.5)):
        with Locations((-20.85, 0)):
            Rectangle(SKETCH58_W, SKETCH58_H)
    extrude(amount=-SIDE_POGO_GAP_DEPTH, mode=Mode.SUBTRACT)

    # Sketch60 → side pogo support (add)
    with BuildSketch(Plane.ZY.offset(19.2)):
        with Locations((0, 36.75)):
            Rectangle(SKETCH60_W, SKETCH60_H)
    extrude(amount=SIDE_POGO_SUPPORT_DEPTH)

    # Sketch14 → Lock bottom support (add)
    with BuildSketch(Plane.XY.offset(-6.75)):
        with Locations((-15.3, 9.7)):
            Circle(SKETCH14_R)
    extrude(amount=LOCK_BOTTOM_SUPPORT_DEPTH)

    # Sketch27 → screw pillar (add)
    with BuildSketch(Plane(origin=(0, 2.5, 0), x_dir=(1, 0, 0), z_dir=(0, 1, 0))):
        with Locations((20, 20)):
            Rectangle(SKETCH27_W, SKETCH27_H)
    screw_pillar = extrude(amount=SCREW_PILLAR_DEPTH)

    # Sketch29 → M2 Tapped Hole1 (revolve, cut)
    with BuildSketch(Plane(origin=(21, 38, -21), x_dir=(0, 0, 1), z_dir=(1, 0, 0))):
        Polygon((0, 0), (0, 5.480688495), (0.8, 5), (0.8, 0), align=None)
    m2_tapped_hole1 = revolve(axis=Axis((21, 44.35, -21), (0, -1, 0)), mode=Mode.SUBTRACT)

    # Mirror1: screw pillar, M2 Tapped Hole1 across plane
    add(screw_pillar.mirror(Plane(origin=(0, 0, 0), x_dir=(0, 0, 1), z_dir=(1, 0, 0))))
    add(m2_tapped_hole1.mirror(Plane(origin=(0, 0, 0), x_dir=(0, 0, 1), z_dir=(1, 0, 0))), mode=Mode.SUBTRACT)

    # Mirror2: screw pillar, M2 Tapped Hole1 across plane
    add(screw_pillar.mirror(Plane.XY))
    add(m2_tapped_hole1.mirror(Plane.XY), mode=Mode.SUBTRACT)

    # Mirror2 copy 1 sketch → Mirror2 copy 1 (add)
    with BuildSketch(Plane(origin=(0, 2.5, 0), x_dir=(-1, 0, 0), z_dir=(0, 1, 0))):
        with Locations((20, 20)):
            Rectangle(MIRROR2_COPY_1_SKETCH_W, MIRROR2_COPY_1_SKETCH_H)
    extrude(amount=MIRROR2_COPY_1_DEPTH)

    # Mirror2 copy 2 sketch → Mirror2 copy 2 (revolve, cut)
    with BuildSketch(Plane(origin=(-21, 38, 21), x_dir=(0, 0, -1), z_dir=(-1, 0, 0))):
        Polygon((0, 0), (0, 5.480688495), (0.8, 5), (0.8, 0), align=None)
    revolve(axis=Axis((-21, 44.35, 21), (0, -1, 0)), mode=Mode.SUBTRACT)

    # Sketch41 → lock support (add)
    with BuildSketch(Plane(origin=(0, 2.5, 0), x_dir=(1, 0, 0), z_dir=(0, 1, 0))):
        Polygon((-22.5, -22.5), (-8.5, -22.5), (-8.5, -8), (-22.5, -8), (-22.5, -17), align=None)
    extrude(amount=LOCK_SUPPORT_DEPTH)

    # Sketch6 → lock cut (cut)
    with BuildSketch(Plane.XY.offset(25)):
        with BuildLine():
            ThreePointArc((-16.15049081, 8.000981053), (-16.643502884, 8.356497116), (-16.999018947, 8.84950919))
            Line((-16.999018947, 8.84950919), (-17.600059711, 8.248468426))
            Line((-17.600059711, 8.248468426), (-16.751531574, 7.399940289))
            Line((-16.751531574, 7.399940289), (-16.15049081, 8.000981053))
        make_face()
        with BuildLine():
            ThreePointArc((-14.44950919, 11.399018947), (-13.956497116, 11.043502884), (-13.600981053, 10.55049081))
            Line((-13.600981053, 10.55049081), (-12.999940289, 11.151531574))
            Line((-12.999940289, 11.151531574), (-13.848468426, 12.000059711))
            Line((-13.848468426, 12.000059711), (-14.44950919, 11.399018947))
        make_face()
        with BuildLine():
            ThreePointArc((-13.4, 9.7), (-13.4509278, 10.136957664), (-13.600981053, 10.55049081))
            ThreePointArc((-13.600981053, 10.55049081), (-13.956497116, 11.043502884), (-14.44950919, 11.399018947))
            ThreePointArc((-14.44950919, 11.399018947), (-16.643502884, 11.043502884), (-16.999018947, 8.84950919))
            ThreePointArc((-16.999018947, 8.84950919), (-16.643502884, 8.356497116), (-16.15049081, 8.000981053))
            ThreePointArc((-16.15049081, 8.000981053), (-14.301484236, 8.083532781), (-13.4, 9.7))
        make_face()
    extrude(amount=-LOCK_CUT_DEPTH, mode=Mode.SUBTRACT)

    # Sketch11 → Spring gap (cut)
    with BuildSketch(Plane.XY.offset(-2.5)):
        with Locations(Location((-15.3, 9.7, 0), (0, 0, 77.682234017))):
            Circle(SKETCH11_R)
    extrude(amount=SPRING_GAP_DEPTH, mode=Mode.SUBTRACT)

    # Sketch12 → Flang gap (cut)
    with BuildSketch(Plane.XY.offset(-2.5)):
        with BuildLine():
            Line((-15.3, 9.7), (-13.274593025, 3.523615411))
            ThreePointArc((-13.274593025, 3.523615411), (-19.63620247, 4.857753812), (-21.661609445, 11.034138401))
            Line((-21.661609445, 11.034138401), (-15.3, 9.7))
        make_face()
    extrude(amount=FLANG_GAP_DEPTH, mode=Mode.SUBTRACT)

    # Sketch52 → flang screw cut (cut)
    with BuildSketch(Plane(origin=(0, 0, 6.75), x_dir=(-1, 0, 0), z_dir=(0, 0, -1))):
        with BuildLine():
            Line((21.568994271, 7.982527778), (25, 5))
            add(Edge.make_bspline(
                [(25, 5), (26.808053779, 2.347485232), (22.598490609, -3.321737418), (20, 0)],
                knots=[0, 0, 0, 0, 1, 1, 1, 1], degree=3))
            Line((20, 0), (17.017472222, 3.431005729))
            Line((17.017472222, 3.431005729), (21.568994271, 7.982527778))
        make_face()
    extrude(amount=-FLANG_SCREW_CUT_DEPTH, mode=Mode.SUBTRACT)

    # Fillet2
    fillet2_edges = [part.edges().sort_by_distance(p)[0] for p in [
        (-19.2, 5.8, -4.625),
    ]]
    fillet(fillet2_edges, radius=FILLET2_R)

    # Sketch59 → bottom pogo support (add)
    with BuildSketch(Plane.XZ.offset(-5.8)):
        with Locations((13.15, 0)):
            Rectangle(SKETCH59_W, SKETCH59_H)
    extrude(amount=BOTTOM_POGO_SUPPORT_DEPTH)

    # Sketch62 → side pogo holder (add)
    with BuildSketch(Plane(origin=(0, 38, 0), x_dir=(1, 0, 0), z_dir=(0, 1, 0))):
        with Locations((-21.1, 0)):
            Rectangle(SKETCH62_W, SKETCH62_H)
        with Locations((-21.1, 0)):
            Rectangle(SKETCH62_W_2, SKETCH62_H_2, mode=Mode.SUBTRACT)
    extrude(amount=SIDE_POGO_HOLDER_DEPTH)

    # Sketch63 → side pogo top (add)
    with BuildSketch(Plane(origin=(0, 40.7, 0), x_dir=(1, 0, 0), z_dir=(0, 1, 0))):
        with Locations((-21.1, -0.018121834)):
            Rectangle(SKETCH63_W, SKETCH63_H)
    extrude(amount=SIDE_POGO_TOP_DEPTH)

    # side pogo hole: up to this face of the body (flat: up to its plane)
    side_pogo_hole_end = Plane(part.part.faces().sort_by_distance((0, 38, -24.292893219))[0])
    # Sketch64 → side pogo hole (cut, up to the picked face)
    with BuildSketch(Plane(origin=(0, 41.2, 0), x_dir=(1, 0, 0), z_dir=(0, 1, 0)), mode=Mode.PRIVATE) as side_pogo_hole_sk1:
        with Locations((-23, -0.018121834)):
            Rectangle(SKETCH64_W, SKETCH64_H)
    side_pogo_hole_tool1 = split(extrude(side_pogo_hole_sk1.sketch, amount=-SIDE_POGO_HOLE_REACH, mode=Mode.PRIVATE), bisect_by=side_pogo_hole_end, keep=Keep.BOTH, mode=Mode.PRIVATE)
    add(side_pogo_hole_tool1.solids().sort_by(Axis((-23, 41.2, 0.018122), (0, -1, 0)))[0], mode=Mode.SUBTRACT)

    # Sketch65 → Cut-Extrude8 (cut)
    with BuildSketch(Plane(origin=(0, 41.2, 0), x_dir=(1, 0, 0), z_dir=(0, 1, 0))):
        with Locations((-23.5, -5.286243668)):
            Rectangle(SKETCH65_W, SKETCH65_H)
        with Locations((-23.5, 5.25)):
            Rectangle(SKETCH65_W, SKETCH65_H)
    extrude(amount=-CUT_EXTRUDE8_DEPTH, mode=Mode.SUBTRACT)


solid = part.part
